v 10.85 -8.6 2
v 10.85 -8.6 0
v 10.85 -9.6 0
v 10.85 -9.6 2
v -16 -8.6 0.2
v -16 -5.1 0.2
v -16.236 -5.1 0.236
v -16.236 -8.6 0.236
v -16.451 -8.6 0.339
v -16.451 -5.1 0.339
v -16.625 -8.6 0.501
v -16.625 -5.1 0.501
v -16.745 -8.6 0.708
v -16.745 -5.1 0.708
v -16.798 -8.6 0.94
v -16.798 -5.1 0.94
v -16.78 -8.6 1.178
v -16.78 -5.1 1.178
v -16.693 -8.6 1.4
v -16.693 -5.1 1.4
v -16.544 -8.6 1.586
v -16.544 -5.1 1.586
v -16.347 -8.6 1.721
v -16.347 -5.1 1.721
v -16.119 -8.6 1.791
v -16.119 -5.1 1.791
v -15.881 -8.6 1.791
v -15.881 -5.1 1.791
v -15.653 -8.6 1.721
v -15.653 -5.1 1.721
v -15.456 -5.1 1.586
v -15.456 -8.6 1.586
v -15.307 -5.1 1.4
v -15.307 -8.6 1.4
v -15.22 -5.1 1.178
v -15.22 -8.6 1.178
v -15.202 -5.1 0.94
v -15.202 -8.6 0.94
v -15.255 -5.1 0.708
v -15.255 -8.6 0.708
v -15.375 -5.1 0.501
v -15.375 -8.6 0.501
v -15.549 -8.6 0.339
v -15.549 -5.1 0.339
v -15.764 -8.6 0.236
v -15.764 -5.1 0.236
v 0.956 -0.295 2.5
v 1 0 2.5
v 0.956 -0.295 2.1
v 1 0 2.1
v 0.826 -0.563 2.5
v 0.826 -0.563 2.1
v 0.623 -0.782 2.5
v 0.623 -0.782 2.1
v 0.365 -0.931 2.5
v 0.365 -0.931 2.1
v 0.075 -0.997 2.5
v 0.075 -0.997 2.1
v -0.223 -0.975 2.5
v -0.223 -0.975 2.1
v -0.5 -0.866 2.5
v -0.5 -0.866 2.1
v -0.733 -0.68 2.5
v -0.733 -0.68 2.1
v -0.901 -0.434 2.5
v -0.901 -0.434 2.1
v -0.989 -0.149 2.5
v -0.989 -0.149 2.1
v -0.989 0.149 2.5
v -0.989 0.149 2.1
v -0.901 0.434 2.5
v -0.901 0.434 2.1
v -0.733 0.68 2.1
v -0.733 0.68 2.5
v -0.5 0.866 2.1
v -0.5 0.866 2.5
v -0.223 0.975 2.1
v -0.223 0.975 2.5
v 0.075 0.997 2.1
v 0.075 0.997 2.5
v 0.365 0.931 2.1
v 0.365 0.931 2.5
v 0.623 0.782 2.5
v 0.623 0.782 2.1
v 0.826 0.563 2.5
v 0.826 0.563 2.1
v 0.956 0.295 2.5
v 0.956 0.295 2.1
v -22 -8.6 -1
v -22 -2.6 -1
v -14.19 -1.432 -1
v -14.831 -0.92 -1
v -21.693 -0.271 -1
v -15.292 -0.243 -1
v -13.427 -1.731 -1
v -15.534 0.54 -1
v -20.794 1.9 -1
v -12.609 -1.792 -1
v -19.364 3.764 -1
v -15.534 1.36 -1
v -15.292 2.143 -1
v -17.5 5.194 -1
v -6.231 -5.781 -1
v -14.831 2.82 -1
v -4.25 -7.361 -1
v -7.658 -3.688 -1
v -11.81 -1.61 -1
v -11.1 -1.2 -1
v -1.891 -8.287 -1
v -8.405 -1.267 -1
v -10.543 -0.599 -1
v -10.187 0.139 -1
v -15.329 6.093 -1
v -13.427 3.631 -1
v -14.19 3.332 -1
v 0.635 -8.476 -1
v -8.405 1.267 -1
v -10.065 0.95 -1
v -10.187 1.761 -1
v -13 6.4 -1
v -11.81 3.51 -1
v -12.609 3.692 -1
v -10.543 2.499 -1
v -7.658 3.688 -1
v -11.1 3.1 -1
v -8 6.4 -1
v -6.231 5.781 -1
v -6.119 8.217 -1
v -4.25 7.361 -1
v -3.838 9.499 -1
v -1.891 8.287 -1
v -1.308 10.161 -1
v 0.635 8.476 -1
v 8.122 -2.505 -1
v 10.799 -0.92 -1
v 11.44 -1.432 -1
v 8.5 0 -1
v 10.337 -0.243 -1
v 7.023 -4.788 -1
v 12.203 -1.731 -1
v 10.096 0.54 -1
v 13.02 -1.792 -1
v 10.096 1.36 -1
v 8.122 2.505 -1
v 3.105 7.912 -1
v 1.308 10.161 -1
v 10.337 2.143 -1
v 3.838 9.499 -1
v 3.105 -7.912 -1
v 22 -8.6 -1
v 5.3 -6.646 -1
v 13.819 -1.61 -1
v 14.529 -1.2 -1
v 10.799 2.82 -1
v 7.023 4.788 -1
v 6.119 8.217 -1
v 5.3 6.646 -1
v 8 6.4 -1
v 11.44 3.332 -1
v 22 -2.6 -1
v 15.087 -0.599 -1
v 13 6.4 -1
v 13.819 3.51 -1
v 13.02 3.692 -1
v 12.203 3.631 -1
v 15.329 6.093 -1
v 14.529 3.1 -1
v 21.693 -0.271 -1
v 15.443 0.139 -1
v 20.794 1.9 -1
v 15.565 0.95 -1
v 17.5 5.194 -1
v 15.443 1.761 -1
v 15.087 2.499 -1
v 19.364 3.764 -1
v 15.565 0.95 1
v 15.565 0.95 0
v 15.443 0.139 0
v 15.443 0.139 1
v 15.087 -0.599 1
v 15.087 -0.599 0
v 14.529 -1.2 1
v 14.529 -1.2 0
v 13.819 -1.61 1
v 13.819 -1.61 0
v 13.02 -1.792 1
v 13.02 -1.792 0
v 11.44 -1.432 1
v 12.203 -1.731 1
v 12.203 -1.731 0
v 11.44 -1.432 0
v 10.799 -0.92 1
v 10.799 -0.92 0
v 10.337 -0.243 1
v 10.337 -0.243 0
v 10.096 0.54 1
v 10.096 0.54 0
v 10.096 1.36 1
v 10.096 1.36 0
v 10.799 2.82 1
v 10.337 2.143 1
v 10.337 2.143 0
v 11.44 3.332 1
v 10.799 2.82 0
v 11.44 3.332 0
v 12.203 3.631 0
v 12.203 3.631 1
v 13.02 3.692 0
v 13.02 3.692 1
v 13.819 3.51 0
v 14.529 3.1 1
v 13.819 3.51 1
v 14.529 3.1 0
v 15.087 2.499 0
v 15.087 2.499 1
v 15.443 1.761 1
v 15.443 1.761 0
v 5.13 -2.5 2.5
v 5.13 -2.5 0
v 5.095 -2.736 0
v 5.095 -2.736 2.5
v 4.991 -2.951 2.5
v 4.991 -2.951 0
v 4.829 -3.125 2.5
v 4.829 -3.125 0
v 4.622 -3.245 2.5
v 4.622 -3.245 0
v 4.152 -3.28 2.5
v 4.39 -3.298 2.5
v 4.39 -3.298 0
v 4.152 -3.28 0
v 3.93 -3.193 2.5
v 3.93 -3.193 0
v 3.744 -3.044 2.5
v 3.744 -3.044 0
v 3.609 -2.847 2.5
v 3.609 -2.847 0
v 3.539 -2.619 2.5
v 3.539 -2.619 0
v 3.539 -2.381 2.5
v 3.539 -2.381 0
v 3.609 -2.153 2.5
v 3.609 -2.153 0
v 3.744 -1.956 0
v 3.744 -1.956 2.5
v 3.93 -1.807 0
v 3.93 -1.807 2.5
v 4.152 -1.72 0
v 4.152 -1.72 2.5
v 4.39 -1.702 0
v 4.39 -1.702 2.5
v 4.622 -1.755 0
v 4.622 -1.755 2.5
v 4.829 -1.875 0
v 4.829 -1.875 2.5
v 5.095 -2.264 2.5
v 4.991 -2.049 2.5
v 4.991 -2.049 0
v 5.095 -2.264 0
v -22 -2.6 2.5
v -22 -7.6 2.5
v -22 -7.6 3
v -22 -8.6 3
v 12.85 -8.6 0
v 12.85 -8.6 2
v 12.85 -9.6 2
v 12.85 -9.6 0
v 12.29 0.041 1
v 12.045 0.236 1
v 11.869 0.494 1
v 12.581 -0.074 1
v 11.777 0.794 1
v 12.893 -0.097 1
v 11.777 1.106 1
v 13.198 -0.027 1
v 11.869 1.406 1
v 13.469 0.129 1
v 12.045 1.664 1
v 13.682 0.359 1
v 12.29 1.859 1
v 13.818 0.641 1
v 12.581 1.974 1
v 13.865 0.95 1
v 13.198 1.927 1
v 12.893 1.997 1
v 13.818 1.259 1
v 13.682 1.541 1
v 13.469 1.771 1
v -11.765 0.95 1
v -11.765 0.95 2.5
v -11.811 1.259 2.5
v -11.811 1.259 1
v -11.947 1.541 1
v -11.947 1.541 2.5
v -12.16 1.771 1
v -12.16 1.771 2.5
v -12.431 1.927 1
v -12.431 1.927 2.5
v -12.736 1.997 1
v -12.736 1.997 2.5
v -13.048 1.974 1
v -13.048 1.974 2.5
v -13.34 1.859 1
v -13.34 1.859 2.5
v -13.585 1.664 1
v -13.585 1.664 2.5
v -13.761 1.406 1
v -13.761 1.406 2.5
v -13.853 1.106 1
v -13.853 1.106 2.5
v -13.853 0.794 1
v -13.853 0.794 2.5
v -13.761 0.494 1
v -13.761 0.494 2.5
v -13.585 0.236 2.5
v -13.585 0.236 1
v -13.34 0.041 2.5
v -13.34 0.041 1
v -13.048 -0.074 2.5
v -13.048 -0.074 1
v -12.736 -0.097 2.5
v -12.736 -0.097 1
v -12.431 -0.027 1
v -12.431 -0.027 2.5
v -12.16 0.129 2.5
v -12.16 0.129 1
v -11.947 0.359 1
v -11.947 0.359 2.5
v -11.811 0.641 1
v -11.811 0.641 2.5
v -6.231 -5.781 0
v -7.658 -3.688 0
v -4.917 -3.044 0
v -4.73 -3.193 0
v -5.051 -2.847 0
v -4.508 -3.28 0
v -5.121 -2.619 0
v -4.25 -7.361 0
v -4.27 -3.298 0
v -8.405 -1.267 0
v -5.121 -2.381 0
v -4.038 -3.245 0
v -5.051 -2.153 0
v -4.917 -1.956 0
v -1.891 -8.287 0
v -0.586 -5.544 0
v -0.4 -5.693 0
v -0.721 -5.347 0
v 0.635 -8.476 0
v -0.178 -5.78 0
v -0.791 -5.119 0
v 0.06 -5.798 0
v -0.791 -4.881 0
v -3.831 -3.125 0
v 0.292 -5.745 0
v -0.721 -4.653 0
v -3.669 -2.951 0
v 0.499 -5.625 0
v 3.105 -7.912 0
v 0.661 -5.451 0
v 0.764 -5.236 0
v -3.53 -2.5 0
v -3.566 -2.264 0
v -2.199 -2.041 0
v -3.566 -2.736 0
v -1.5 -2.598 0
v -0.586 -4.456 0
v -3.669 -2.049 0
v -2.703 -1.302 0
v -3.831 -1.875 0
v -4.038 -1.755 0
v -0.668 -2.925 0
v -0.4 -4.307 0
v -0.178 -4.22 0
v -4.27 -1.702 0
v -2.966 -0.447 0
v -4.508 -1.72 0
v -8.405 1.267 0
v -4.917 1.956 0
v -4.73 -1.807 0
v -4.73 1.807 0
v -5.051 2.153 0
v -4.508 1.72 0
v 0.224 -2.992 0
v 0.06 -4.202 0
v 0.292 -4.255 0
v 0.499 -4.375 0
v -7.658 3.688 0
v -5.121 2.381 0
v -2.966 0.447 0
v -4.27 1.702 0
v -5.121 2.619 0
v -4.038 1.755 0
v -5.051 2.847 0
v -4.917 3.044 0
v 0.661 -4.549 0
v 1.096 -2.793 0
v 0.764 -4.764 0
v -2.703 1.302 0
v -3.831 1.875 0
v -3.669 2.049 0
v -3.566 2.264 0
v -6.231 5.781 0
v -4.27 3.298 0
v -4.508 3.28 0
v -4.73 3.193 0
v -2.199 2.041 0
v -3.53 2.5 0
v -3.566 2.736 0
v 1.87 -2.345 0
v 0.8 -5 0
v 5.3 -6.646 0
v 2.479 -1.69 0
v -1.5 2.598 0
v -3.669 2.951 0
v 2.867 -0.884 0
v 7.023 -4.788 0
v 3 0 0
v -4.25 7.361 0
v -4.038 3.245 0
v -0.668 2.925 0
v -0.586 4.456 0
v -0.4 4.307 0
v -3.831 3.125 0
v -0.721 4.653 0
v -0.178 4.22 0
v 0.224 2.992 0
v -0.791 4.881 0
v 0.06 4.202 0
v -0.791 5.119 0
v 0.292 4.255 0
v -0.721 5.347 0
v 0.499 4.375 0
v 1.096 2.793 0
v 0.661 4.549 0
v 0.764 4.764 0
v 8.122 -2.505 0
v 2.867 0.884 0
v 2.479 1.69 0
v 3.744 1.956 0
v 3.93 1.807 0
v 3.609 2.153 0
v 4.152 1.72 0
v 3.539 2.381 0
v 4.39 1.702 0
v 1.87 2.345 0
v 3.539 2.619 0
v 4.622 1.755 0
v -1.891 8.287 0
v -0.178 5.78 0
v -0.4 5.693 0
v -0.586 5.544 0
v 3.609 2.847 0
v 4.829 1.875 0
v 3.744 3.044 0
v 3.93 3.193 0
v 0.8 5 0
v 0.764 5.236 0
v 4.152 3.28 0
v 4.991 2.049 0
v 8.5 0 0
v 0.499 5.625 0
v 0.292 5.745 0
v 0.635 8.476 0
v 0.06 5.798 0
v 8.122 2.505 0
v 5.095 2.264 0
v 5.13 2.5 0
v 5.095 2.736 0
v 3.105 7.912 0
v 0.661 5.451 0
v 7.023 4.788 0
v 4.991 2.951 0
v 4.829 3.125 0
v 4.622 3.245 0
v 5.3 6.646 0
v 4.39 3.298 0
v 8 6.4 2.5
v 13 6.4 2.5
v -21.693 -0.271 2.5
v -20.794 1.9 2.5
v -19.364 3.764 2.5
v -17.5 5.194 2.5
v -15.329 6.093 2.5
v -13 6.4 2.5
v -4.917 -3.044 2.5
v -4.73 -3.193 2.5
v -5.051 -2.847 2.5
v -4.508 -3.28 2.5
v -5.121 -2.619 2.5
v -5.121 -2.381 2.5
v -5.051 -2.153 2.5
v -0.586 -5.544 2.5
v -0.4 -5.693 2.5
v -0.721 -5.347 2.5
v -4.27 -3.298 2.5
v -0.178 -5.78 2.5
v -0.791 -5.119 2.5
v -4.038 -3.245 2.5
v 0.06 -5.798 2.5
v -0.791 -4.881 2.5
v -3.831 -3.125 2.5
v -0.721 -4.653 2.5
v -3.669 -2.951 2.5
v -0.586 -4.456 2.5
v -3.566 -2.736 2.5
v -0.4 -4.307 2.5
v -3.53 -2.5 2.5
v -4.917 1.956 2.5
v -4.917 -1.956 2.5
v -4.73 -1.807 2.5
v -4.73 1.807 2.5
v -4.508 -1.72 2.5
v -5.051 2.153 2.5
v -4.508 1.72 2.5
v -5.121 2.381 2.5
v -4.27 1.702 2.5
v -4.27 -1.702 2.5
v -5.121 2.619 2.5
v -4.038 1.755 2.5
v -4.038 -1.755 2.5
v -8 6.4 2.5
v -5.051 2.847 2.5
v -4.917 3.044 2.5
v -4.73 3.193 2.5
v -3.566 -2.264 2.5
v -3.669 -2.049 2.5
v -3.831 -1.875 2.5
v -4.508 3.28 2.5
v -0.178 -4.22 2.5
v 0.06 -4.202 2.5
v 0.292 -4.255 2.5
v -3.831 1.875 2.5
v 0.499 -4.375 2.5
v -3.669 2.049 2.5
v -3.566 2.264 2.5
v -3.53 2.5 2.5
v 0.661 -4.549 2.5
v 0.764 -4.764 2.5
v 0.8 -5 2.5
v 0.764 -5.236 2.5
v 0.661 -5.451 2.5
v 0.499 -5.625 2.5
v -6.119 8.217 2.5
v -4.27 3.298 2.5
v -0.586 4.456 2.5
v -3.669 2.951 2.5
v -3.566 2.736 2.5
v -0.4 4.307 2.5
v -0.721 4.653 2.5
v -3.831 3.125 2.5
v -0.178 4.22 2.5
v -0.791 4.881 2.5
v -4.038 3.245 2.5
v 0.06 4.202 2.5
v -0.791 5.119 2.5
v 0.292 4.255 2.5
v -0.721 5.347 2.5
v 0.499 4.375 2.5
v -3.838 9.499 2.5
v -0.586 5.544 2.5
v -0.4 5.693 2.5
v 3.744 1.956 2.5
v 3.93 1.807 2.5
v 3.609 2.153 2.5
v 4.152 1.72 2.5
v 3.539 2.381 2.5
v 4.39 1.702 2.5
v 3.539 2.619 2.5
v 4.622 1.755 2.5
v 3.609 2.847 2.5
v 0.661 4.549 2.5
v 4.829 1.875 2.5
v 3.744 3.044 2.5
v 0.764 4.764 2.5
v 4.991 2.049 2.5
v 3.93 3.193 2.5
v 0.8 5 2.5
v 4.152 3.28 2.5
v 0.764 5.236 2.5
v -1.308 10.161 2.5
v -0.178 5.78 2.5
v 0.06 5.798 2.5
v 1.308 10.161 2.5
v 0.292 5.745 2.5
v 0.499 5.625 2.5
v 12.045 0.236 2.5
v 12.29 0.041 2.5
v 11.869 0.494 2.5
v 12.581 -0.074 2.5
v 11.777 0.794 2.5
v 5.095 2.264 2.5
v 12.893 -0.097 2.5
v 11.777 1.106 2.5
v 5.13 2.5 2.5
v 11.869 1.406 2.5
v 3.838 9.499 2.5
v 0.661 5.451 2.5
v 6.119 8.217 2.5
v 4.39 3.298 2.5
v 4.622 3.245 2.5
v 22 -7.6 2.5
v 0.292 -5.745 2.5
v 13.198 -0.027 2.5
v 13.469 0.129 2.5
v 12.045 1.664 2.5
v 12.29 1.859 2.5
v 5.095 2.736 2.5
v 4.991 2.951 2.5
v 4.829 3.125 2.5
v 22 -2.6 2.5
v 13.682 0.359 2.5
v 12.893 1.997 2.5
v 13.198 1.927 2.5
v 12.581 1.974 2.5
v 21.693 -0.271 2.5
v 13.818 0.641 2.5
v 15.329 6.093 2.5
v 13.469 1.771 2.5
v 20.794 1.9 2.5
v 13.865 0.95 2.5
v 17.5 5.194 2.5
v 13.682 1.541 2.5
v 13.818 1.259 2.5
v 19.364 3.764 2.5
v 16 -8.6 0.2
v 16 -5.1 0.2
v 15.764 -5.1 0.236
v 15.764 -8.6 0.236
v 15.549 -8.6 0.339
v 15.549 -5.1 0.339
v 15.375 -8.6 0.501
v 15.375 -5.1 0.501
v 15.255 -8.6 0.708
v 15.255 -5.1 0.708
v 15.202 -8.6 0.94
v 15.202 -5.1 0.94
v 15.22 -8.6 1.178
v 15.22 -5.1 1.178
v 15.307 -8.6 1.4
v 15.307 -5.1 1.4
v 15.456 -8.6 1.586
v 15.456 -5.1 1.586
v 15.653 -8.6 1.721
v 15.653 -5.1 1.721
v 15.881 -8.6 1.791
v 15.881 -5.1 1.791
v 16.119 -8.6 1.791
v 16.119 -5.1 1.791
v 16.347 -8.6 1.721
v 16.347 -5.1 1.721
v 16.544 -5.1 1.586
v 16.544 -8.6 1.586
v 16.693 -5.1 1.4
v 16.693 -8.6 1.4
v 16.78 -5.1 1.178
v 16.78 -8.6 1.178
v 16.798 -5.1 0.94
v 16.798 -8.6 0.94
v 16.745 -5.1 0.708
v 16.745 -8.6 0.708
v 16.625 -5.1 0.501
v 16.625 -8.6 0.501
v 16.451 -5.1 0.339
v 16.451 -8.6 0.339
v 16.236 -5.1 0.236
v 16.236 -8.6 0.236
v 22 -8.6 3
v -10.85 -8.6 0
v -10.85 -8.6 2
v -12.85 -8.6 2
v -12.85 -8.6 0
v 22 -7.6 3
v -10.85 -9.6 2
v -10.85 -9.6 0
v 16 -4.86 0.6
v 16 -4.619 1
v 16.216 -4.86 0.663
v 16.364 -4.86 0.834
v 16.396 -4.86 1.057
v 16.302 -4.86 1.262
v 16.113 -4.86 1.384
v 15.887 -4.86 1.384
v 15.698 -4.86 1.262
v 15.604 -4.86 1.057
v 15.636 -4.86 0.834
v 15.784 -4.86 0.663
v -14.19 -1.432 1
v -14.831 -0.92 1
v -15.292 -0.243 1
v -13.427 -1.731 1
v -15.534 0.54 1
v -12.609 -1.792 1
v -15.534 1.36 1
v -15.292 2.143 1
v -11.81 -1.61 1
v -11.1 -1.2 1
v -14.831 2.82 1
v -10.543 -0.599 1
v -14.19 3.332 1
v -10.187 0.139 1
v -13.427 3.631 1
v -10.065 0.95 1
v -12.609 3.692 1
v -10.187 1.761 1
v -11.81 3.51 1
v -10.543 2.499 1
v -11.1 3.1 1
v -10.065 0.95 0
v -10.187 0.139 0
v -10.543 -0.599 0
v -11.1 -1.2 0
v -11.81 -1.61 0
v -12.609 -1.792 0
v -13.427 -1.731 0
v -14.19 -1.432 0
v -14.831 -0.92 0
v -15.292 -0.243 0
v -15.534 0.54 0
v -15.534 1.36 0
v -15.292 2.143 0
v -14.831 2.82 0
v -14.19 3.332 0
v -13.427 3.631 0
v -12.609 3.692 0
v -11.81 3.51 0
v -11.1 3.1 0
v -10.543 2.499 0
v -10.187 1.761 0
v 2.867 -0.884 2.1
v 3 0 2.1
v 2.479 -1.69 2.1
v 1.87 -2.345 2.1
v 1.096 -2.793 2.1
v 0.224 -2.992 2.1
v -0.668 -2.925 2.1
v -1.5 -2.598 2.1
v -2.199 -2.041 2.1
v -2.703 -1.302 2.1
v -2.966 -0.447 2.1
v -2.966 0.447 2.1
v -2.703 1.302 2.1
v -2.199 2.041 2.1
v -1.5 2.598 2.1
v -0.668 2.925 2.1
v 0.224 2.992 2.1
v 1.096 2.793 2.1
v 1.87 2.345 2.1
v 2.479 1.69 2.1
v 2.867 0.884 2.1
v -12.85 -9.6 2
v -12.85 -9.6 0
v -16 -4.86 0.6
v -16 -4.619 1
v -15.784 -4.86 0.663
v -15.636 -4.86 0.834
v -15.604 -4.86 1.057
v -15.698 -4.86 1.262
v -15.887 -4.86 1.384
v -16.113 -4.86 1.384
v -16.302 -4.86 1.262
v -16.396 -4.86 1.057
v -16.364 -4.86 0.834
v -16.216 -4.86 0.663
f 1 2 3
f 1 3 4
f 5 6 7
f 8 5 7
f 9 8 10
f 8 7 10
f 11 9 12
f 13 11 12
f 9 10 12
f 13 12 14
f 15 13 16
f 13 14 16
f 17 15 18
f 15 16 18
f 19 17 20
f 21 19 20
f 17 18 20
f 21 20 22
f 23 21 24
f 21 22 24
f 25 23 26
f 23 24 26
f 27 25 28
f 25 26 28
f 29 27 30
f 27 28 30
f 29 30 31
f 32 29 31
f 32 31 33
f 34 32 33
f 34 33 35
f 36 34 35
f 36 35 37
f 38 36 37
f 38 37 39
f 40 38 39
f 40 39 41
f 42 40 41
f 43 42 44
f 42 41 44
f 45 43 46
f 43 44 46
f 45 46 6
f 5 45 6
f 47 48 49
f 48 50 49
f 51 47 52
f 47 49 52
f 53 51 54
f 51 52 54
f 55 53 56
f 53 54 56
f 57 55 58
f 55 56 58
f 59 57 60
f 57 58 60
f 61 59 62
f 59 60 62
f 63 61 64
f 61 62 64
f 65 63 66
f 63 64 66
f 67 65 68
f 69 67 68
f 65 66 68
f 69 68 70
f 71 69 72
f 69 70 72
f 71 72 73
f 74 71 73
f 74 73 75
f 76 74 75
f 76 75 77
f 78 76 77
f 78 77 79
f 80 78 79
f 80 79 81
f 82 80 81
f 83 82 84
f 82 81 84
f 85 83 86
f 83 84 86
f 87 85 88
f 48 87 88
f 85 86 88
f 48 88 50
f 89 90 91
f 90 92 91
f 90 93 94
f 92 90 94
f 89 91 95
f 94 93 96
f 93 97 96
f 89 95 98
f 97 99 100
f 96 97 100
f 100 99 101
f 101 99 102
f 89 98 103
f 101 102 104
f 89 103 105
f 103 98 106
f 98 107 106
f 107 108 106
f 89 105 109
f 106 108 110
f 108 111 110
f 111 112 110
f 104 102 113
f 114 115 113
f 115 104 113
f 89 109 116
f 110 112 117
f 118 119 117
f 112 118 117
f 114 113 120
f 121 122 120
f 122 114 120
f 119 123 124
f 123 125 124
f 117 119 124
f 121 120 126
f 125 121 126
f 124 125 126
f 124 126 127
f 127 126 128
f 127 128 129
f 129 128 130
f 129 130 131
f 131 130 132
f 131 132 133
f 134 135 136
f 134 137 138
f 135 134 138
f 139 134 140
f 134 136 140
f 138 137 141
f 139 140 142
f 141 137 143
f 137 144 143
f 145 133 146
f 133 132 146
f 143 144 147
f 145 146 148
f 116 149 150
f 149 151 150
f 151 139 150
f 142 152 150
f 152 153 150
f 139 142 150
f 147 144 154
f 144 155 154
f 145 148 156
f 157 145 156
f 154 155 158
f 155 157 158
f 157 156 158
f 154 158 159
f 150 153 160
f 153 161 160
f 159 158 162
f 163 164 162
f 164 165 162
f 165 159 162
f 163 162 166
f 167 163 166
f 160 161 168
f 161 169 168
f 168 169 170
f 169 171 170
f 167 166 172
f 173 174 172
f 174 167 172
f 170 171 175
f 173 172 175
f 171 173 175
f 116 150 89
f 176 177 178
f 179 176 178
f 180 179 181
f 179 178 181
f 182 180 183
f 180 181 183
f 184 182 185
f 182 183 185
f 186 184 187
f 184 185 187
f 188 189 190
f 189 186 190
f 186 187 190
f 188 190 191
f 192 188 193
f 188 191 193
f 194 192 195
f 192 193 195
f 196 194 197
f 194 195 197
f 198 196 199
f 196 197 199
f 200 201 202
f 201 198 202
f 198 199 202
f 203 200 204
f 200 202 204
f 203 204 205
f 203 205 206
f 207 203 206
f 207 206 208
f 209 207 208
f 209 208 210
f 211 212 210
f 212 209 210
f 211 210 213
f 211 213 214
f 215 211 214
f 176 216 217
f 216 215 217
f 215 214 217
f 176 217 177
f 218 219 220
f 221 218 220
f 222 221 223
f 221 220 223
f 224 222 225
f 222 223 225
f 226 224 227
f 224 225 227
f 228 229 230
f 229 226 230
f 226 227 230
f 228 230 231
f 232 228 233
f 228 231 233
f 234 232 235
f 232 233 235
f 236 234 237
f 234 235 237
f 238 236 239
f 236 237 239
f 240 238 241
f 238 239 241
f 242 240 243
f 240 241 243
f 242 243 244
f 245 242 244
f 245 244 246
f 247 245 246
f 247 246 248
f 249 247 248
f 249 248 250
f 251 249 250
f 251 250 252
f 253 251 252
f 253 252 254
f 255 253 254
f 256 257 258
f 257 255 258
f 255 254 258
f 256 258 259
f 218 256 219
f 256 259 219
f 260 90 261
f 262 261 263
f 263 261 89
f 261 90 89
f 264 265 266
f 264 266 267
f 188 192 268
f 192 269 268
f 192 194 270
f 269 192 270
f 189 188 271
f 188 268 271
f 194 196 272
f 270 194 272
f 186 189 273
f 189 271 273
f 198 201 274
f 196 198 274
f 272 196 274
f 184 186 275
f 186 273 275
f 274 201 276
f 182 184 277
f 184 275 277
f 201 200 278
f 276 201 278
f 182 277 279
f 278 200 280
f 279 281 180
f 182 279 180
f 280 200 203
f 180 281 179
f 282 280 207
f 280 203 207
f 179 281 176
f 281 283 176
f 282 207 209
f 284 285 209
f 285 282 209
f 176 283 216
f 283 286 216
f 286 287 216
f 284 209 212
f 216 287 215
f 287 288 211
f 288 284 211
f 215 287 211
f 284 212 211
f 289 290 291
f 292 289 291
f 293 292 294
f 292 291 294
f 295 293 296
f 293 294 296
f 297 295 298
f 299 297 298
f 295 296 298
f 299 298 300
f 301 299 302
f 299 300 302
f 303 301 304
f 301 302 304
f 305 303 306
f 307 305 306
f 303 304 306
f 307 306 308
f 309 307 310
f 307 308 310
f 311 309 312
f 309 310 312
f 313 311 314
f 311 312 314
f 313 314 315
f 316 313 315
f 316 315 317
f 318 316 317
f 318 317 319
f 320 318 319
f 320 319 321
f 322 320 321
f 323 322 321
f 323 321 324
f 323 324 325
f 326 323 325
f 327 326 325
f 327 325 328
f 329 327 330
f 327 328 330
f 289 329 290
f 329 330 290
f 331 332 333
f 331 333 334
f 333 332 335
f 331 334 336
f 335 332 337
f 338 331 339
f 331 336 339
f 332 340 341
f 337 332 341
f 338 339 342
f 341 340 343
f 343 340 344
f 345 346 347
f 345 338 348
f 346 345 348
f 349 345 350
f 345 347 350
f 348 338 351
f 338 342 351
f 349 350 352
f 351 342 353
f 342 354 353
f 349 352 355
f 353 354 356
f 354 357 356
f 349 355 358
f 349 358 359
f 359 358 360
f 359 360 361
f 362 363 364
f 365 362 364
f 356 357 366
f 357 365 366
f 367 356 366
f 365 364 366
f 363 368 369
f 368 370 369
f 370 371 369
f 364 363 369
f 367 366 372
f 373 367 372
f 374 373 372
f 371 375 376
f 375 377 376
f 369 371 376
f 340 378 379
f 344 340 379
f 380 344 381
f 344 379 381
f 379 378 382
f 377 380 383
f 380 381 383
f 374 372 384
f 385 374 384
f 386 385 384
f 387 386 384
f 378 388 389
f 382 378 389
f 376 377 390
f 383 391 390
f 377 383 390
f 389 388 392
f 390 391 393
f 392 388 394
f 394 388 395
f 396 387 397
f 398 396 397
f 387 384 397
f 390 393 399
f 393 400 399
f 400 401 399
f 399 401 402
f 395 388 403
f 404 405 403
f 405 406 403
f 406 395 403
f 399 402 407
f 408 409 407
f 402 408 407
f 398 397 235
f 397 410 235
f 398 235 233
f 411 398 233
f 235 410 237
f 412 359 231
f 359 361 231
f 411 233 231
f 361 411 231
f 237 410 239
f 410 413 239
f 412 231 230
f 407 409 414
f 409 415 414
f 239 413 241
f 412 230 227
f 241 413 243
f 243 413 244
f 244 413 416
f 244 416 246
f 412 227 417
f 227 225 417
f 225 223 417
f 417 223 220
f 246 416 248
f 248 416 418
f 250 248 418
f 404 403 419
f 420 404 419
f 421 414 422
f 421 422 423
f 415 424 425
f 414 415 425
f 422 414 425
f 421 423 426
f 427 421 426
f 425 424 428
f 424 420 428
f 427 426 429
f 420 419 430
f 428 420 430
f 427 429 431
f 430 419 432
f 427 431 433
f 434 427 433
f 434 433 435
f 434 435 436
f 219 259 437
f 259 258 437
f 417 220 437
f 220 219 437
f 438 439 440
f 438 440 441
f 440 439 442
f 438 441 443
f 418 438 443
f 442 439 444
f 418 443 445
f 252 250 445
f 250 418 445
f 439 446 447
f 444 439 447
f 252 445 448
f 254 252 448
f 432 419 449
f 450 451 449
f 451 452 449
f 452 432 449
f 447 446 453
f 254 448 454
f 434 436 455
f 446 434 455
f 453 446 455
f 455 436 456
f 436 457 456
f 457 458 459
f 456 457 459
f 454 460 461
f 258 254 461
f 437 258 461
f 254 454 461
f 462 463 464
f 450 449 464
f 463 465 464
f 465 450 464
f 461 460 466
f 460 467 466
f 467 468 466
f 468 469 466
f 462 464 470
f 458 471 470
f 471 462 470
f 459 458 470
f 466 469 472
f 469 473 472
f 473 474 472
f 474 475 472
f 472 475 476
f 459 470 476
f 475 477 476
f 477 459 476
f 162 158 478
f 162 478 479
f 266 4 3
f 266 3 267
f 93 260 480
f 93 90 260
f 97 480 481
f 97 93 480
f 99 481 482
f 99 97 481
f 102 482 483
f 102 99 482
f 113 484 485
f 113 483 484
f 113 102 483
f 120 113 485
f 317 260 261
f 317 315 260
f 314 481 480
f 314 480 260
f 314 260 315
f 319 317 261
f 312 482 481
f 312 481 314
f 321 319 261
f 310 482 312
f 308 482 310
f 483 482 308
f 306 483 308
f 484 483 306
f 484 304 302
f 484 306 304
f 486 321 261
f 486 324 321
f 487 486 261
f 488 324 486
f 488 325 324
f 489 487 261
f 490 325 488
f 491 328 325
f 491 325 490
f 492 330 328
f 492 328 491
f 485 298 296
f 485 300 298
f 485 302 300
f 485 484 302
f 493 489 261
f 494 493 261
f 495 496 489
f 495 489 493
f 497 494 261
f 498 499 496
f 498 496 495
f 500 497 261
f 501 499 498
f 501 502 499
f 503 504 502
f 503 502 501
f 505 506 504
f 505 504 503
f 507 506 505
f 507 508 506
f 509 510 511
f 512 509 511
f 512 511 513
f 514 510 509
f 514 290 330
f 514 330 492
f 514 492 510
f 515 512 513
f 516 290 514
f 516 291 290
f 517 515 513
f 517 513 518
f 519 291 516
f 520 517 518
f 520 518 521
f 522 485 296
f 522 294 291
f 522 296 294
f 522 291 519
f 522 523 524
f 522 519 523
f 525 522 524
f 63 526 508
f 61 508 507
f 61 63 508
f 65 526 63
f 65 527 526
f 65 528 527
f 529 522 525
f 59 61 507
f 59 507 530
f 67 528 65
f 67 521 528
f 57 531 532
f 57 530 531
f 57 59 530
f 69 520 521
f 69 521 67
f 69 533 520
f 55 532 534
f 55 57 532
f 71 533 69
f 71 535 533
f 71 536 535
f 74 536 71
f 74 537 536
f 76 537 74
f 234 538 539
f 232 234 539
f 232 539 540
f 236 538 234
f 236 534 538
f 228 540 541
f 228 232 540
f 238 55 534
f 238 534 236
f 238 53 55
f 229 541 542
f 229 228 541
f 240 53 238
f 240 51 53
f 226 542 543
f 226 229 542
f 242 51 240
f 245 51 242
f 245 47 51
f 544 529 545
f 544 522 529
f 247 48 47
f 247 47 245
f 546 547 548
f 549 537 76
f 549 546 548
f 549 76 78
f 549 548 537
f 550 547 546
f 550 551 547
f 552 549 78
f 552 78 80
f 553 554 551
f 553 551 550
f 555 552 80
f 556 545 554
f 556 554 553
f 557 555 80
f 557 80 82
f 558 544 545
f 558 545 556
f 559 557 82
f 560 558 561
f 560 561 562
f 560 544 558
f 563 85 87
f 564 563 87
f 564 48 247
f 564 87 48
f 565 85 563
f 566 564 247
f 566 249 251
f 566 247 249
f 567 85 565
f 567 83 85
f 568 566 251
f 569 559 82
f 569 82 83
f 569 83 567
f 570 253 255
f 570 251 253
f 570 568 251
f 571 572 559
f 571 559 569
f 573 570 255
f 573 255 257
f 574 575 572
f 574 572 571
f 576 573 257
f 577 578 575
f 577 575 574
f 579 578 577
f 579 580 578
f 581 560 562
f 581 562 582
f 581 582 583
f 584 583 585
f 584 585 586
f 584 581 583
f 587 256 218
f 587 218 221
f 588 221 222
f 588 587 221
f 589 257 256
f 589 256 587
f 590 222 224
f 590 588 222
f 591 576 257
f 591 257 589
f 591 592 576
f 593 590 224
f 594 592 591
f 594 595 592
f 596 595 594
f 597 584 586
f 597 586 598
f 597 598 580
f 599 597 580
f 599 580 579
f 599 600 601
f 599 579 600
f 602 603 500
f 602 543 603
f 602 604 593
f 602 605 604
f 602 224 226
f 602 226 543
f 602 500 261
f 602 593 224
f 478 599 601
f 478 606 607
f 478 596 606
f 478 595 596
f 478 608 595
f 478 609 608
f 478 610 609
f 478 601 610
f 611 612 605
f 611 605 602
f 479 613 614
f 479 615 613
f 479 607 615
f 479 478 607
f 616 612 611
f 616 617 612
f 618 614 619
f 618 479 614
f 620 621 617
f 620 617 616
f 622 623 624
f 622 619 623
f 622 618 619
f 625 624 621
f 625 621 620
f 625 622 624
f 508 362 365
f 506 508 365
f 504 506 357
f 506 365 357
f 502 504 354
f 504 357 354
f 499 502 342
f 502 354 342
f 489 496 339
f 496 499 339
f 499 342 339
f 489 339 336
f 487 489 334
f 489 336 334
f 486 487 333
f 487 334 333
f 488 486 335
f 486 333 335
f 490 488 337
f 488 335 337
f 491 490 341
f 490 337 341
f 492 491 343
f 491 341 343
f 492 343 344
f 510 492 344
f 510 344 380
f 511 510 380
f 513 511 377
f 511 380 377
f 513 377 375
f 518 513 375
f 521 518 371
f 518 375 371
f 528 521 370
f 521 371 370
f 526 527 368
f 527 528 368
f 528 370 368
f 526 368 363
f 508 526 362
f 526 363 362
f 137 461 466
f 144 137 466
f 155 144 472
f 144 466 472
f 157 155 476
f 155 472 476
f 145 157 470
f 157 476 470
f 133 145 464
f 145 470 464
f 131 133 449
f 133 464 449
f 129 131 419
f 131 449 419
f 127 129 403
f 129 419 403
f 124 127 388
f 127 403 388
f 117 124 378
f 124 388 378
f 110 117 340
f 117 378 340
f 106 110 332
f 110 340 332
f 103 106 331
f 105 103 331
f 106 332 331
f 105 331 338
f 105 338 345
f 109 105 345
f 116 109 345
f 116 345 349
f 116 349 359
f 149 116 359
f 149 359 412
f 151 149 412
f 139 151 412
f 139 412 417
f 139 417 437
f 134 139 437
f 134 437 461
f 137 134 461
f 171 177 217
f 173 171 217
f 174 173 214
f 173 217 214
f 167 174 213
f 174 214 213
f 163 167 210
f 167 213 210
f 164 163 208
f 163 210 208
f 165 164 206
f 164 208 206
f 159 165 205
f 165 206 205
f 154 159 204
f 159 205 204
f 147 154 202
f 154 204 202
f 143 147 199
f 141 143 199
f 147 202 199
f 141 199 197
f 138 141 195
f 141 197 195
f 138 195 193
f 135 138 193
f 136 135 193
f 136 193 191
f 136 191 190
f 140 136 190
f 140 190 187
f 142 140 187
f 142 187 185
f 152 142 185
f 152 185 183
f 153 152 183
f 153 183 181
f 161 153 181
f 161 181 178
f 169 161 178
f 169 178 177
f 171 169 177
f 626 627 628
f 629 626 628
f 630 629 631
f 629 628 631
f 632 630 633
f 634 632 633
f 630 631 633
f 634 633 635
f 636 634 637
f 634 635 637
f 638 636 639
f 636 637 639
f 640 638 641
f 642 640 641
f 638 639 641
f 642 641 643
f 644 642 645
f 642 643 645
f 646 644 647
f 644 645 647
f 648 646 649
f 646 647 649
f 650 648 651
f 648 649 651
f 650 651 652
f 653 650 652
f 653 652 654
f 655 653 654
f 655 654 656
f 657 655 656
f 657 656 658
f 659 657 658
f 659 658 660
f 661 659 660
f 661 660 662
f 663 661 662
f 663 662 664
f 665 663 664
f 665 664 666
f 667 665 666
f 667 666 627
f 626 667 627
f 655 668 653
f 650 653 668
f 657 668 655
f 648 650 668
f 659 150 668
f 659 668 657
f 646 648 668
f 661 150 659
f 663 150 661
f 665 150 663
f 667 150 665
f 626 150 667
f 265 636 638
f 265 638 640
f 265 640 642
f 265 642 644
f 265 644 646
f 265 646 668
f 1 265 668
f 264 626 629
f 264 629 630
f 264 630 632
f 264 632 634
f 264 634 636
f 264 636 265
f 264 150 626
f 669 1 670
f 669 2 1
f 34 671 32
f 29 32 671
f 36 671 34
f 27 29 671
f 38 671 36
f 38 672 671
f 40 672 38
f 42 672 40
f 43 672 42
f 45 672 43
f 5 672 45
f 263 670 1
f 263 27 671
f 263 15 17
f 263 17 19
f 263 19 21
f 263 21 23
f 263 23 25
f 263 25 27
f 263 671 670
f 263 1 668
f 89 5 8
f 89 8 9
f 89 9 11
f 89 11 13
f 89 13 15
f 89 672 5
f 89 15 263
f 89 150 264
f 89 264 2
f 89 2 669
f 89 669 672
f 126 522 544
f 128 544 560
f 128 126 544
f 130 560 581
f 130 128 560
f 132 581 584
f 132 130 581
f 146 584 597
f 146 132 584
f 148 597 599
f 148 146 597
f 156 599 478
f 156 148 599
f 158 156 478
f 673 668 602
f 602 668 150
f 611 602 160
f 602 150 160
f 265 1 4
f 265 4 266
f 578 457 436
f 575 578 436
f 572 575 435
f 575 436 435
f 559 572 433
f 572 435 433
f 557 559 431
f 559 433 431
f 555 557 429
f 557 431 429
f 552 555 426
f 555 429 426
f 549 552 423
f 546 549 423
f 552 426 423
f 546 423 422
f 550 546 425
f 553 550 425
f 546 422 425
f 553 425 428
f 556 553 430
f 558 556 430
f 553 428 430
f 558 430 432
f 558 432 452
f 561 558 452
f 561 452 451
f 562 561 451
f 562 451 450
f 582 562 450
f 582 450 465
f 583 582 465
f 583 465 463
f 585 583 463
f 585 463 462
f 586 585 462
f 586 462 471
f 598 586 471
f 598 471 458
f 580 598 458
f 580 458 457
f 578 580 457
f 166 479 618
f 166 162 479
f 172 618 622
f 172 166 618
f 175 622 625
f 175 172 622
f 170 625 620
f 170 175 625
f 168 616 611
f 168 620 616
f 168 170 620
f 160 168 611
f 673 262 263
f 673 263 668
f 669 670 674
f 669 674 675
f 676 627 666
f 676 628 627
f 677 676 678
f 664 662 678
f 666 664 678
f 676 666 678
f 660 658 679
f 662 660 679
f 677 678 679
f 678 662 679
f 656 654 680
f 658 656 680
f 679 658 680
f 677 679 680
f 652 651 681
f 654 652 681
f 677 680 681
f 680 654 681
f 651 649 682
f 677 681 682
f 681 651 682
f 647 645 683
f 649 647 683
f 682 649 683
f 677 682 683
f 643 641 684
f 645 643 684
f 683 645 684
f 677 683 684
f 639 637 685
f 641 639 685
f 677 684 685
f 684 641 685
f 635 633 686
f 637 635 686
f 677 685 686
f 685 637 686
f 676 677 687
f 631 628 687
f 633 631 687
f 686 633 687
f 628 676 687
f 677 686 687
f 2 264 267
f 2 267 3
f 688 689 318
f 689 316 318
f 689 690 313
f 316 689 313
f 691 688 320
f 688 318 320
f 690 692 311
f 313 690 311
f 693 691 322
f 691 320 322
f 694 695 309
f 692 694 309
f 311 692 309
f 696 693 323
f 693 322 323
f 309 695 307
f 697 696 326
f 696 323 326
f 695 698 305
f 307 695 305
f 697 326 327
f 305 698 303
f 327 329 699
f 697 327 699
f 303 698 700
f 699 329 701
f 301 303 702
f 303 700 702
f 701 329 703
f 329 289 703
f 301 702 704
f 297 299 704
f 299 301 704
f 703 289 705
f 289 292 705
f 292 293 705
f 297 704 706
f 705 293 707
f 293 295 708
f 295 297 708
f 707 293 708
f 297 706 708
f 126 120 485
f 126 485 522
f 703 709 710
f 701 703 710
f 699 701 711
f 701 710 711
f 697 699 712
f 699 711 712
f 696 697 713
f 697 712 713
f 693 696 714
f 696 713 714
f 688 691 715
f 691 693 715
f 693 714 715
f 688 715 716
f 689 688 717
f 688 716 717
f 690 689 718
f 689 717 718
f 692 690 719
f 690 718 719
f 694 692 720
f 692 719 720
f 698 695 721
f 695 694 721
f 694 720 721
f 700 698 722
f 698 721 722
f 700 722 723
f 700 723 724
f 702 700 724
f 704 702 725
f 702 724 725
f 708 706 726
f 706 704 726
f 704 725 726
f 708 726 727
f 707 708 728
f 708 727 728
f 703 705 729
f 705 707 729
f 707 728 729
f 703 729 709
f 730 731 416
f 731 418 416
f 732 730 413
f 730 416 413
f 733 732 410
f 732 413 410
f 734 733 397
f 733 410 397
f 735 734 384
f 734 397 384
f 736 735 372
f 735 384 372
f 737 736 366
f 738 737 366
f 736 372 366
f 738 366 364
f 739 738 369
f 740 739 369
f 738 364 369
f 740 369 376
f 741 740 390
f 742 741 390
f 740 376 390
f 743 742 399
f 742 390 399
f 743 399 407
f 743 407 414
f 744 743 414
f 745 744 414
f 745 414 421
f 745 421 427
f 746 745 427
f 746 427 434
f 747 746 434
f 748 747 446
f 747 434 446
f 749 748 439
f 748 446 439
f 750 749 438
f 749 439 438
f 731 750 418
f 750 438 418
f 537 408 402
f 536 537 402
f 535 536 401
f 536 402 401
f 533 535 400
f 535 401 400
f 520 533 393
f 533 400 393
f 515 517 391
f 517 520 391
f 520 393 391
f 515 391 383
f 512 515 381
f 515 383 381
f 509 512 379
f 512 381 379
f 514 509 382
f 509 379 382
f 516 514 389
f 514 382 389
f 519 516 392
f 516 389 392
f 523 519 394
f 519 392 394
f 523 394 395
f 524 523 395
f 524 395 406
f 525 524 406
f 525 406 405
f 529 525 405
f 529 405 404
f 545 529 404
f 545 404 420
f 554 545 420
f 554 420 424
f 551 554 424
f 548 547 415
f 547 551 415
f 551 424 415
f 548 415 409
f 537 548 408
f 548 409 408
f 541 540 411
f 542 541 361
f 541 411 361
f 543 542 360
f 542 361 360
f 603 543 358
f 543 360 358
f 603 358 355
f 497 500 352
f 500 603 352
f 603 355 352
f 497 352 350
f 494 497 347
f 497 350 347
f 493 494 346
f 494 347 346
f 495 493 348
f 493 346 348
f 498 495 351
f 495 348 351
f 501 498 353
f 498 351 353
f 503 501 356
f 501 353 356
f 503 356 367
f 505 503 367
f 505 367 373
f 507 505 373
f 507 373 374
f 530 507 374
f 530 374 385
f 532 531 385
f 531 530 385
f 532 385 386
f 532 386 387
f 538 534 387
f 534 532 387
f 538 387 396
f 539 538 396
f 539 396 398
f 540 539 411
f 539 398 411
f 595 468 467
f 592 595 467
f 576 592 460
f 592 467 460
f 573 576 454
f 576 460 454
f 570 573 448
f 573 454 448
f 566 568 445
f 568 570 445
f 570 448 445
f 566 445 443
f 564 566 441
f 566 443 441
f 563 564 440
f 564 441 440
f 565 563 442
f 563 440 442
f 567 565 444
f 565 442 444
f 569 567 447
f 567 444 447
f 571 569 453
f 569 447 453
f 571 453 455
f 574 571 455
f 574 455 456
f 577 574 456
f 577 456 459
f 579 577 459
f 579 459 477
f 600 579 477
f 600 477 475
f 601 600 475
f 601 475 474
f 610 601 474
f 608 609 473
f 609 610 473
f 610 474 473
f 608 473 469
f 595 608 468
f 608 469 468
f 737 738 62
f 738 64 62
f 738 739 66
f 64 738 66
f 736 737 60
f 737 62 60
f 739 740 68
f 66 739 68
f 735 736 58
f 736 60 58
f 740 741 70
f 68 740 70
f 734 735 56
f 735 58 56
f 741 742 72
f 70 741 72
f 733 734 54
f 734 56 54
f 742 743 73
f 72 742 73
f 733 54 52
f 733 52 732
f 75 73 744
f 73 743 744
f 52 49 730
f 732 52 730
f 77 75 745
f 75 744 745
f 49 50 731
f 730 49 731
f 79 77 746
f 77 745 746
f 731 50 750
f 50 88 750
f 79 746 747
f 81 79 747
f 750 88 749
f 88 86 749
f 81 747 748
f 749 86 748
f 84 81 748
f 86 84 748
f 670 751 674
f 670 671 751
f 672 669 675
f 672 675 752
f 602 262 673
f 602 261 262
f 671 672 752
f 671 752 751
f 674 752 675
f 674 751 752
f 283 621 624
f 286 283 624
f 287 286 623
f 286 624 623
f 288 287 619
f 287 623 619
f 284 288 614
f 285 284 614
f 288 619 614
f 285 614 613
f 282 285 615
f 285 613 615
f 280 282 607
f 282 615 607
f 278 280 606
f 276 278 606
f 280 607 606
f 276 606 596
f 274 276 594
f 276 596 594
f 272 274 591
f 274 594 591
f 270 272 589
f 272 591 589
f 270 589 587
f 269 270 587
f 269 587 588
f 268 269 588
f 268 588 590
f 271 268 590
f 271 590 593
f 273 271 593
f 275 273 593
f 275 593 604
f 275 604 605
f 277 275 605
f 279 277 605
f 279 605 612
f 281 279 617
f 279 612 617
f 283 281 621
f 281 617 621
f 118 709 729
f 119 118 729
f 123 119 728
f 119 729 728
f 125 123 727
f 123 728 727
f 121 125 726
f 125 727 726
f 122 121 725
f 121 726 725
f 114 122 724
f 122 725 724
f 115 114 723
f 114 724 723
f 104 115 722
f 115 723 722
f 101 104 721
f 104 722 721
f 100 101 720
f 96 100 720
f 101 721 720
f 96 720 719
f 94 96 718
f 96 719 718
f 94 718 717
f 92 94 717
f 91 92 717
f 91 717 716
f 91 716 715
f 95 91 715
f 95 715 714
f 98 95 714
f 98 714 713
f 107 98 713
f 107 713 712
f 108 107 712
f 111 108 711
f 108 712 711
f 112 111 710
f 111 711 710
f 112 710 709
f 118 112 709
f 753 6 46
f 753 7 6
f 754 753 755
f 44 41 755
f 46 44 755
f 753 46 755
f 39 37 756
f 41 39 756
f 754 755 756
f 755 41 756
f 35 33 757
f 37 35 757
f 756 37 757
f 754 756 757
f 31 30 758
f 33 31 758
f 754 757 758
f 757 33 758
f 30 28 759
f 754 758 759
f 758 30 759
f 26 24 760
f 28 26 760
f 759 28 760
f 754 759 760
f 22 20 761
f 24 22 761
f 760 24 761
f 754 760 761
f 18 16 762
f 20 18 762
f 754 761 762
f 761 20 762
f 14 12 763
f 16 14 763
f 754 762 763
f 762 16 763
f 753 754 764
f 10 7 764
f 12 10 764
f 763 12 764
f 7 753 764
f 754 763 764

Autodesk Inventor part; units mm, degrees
ref_plane "YZ Plane" through (0, 0, 0) normal (1, 0, 0) x (0, 1, 0)
ref_plane "XZ Plane" through (0, 0, 0) normal (0, 1, 0) x (-1, 0, 0)
ref_plane "XY Plane" through (0, 0, 0) normal (0, 0, 1) x (1, 0, 0)
sketch "構築線" plane through (0, 0, 0) normal (0, 0, 1) x (1, 0, 0)
  circle A0 centre (0, 0) radius 8.5
  circle A1 centre (0, 0) radius 2.8 construction
  circle A2 centre (0, 0) radius 5 construction
  line L0 (0, -8.6) -> (-25, -8.6) construction
  line L1 (0, -11.6) -> (-25, -11.6) construction
  circle A3 centre (-12.8148, 0.95) radius 10.05 construction
  circle A4 centre (-12.8148, 0.95) radius 12.55 construction
  circle A5 centre (0, 5) radius 0.8
  circle A6 centre (-4.3301, 2.5) radius 0.8
  circle A7 centre (-4.3301, -2.5) radius 0.8
  circle A8 centre (0, -5) radius 0.8
  circle A9 centre (4.3301, -2.5) radius 0.8
  circle A10 centre (4.3301, 2.5) radius 0.8
  line L2 (25, -8.6) -> (0, -8.6) construction
  circle A11 centre (12.8148, 0.95) radius 10.05 construction
  circle A12 centre (12.8148, 0.95) radius 12.55 construction
  line L3 (0, -11.6) -> (25, -11.6) construction
  line L4 (-22, -8.6) -> (-22, -2.6)
  arc A13 (-13, 6.4) -> (-22, -2.6) centre (-13, -2.6) ccw
  line L5 (-13, 6.4) -> (-8, 6.4)
  line L6 (-22, -8.6) -> (0, -8.6)
  line L7 (0, 25) -> (0, -25)
  line L8 (0, -8.6) -> (22, -8.6)
  line L9 (22, -8.6) -> (22, -2.6)
  arc A14 (8, 6.4) -> (-8, 6.4) centre (0, 0) ccw
  line L10 (8, 6.4) -> (13, 6.4)
  arc A15 (22, -2.6) -> (13, 6.4) centre (13, -2.6) ccw
  circle A16 centre (0, 0) radius 3
  circle A17 centre (0, 0) radius 1
  circle A18 centre (12.8148, 0.95) radius 1.05
  circle A19 centre (-12.8148, 0.95) radius 1.05
  circle A20 centre (12.8148, 0.95) radius 2.75
  circle A21 centre (-12.8148, 0.95) radius 2.75
  dimension "d0" = 17
  dimension "d1" = 5.6
  dimension "d2" = 10
  dimension "d12" = 25
  dimension "d13" = 8.6
  dimension "d14" = 0
  dimension "d17" = 0
  dimension "d18" = 25
  dimension "d19" = 3
  dimension "d22" = 20.1
  dimension "d23" = 25.1
  dimension "d29" = 1.6
  dimension "d30" = 0
  dimension "d31" = 5
  dimension "d34" = 360
  dimension "d38" = 25
  dimension "d41" = 20.1
  dimension "d42" = 25.1
  dimension "d43" = 25
  dimension "d46" = 22
  dimension "d47" = 6
  dimension "d48" = 5
  dimension "d49" = 50
  dimension "d50" = 25
  dimension "d51" = 25
  dimension "d52" = 22
  dimension "d53" = 6
  dimension "d56" = 15
  dimension "d57" = 15
  dimension "d58" = 6
  dimension "d59" = 2
  dimension "d99" = 2.1
  dimension "d100" = 2.1
  dimension "d105" = 5.5
  dimension "d106" = 5.5
extrude "外形作成" add sketch "構築線" along normal blind 2.5 and the other way blind 1 contours A0 L7 A8 A16 A5 | A0 L7 A14 L10 A15 L9 L8 | L7 A5 A16 A8 A0 | A0 L7 L6 L4 A13 L5 A14 | A16 L7 A17 | L7 A17 A16 | A18 | A19 | A20 | A21
extrude "押し出し4" cut sketch "構築線" against normal blind 1 contours A0 L7 A8 A16 A5 | L7 A5 A16 A8 A0 | A16 L7 A17 | L7 A17 A16
sketch "固定具" plane through (-22, -8.6, 2.5) normal (0, -1, 0) x (1, 0, 0)
  circle A0 centre (6, -1.5) radius 1.05
  line L0 (0, 0) -> (0, -3.5) projected
  line L1 (0, 0) -> (44, 0) projected
  circle A1 centre (38, -1.5) radius 1.05
  line L2 (9.15, -0.5) -> (11.15, -0.5)
  line L3 (11.15, -0.5) -> (11.15, -2.5)
  line L4 (11.15, -2.5) -> (9.15, -2.5)
  line L5 (9.15, -2.5) -> (9.15, -0.5)
  line L6 (44, -3.5) -> (0, -3.5) projected
  line L7 (32.85, -0.5) -> (34.85, -0.5)
  line L8 (34.85, -0.5) -> (34.85, -2.5)
  line L9 (34.85, -2.5) -> (32.85, -2.5)
  line L10 (32.85, -2.5) -> (32.85, -0.5)
  point P0 (22, -2.5)
  dimension "d66" = 2.1
  dimension "d67" = 6
  dimension "d68" = 1.5
  dimension "d69" = 2.1
  dimension "d70" = 32
  dimension "d71" = 1.5
  dimension "d115" = 2
  dimension "d116" = 2
  dimension "d117" = 2.1
  dimension "d118" = 1
  dimension "d119" = 2
  dimension "d120" = 2
  dimension "d121" = 2.1
  dimension "d122" = 1
hole "穴1" at (16, -8.6, 1) direction (0, 1, 0) diameter 1.6 depth 3.5 tip angle 118
hole "穴2" at (-16, -8.6, 1) direction (0, 1, 0) diameter 1.6 depth 3.5 tip angle 118
extrude "押し出し5" cut sketch "構築線" along normal blind 2.1 contours A16 L7 A17 | L7 A17 A16
sketch "スケッチ6" plane through (0, 0, 2.5) normal (0, 0, 1) x (1, 0, 0)
  circle A0 centre (0, 0) radius 1 projected
  circle A1 centre (4.3301, 2.5) radius 0.8 projected
  circle A2 centre (4.3301, -2.5) radius 0.8 projected
  circle A3 centre (0, -5) radius 0.8 projected
  circle A4 centre (-4.3301, -2.5) radius 0.8 projected
  circle A5 centre (-4.3301, 2.5) radius 0.8 projected
  circle A6 centre (0, 5) radius 0.8 projected
  line L0 (-22, -8.6) -> (22, -8.6) construction
  line L1 (22, -8.6) -> (22, -2.6) construction
  arc A7 (22, -2.6) -> (13, 6.4) centre (13, -2.6) ccw construction
  line L2 (13, 6.4) -> (8, 6.4) construction
  arc A8 (8, 6.4) -> (-8, 6.4) centre (0, 0) ccw construction
  line L3 (-8, 6.4) -> (-13, 6.4) construction
  arc A9 (-13, 6.4) -> (-22, -2.6) centre (-13, -2.6) ccw construction
  line L4 (-22, -2.6) -> (-22, -8.6) construction
  line L5 (-22, -7.6) -> (22, -7.6)
  line L6 (-22, -2.6) -> (-22, -8.6) projected
  line L7 (-22, -7.6) -> (-22, -8.6)
  line L8 (22, -8.6) -> (-22, -8.6) projected
  line L9 (22, -8.6) -> (22, -7.6)
  dimension "d95" = 44
  dimension "d96" = 1
extrude "押し出し6" add sketch "スケッチ6" along normal blind 0.5 contours L5 L9 L8 L6
extrude "押し出し7" cut sketch "構築線" against normal blind 1 and the other way blind 3 contours A18 | A19
extrude "押し出し8" cut sketch "構築線" along normal blind 1 and the other way blind 1 contours A20
extrude "押し出し9" cut sketch "構築線" along normal blind 1 and the other way blind 1 contours A21
extrude "押し出し10" add sketch "固定具" along normal blind 1 contours L2 L3 L4 L5 | L7 L8 L9 L10
equation "\"d18\" = d12"
properties part number "mount2"
